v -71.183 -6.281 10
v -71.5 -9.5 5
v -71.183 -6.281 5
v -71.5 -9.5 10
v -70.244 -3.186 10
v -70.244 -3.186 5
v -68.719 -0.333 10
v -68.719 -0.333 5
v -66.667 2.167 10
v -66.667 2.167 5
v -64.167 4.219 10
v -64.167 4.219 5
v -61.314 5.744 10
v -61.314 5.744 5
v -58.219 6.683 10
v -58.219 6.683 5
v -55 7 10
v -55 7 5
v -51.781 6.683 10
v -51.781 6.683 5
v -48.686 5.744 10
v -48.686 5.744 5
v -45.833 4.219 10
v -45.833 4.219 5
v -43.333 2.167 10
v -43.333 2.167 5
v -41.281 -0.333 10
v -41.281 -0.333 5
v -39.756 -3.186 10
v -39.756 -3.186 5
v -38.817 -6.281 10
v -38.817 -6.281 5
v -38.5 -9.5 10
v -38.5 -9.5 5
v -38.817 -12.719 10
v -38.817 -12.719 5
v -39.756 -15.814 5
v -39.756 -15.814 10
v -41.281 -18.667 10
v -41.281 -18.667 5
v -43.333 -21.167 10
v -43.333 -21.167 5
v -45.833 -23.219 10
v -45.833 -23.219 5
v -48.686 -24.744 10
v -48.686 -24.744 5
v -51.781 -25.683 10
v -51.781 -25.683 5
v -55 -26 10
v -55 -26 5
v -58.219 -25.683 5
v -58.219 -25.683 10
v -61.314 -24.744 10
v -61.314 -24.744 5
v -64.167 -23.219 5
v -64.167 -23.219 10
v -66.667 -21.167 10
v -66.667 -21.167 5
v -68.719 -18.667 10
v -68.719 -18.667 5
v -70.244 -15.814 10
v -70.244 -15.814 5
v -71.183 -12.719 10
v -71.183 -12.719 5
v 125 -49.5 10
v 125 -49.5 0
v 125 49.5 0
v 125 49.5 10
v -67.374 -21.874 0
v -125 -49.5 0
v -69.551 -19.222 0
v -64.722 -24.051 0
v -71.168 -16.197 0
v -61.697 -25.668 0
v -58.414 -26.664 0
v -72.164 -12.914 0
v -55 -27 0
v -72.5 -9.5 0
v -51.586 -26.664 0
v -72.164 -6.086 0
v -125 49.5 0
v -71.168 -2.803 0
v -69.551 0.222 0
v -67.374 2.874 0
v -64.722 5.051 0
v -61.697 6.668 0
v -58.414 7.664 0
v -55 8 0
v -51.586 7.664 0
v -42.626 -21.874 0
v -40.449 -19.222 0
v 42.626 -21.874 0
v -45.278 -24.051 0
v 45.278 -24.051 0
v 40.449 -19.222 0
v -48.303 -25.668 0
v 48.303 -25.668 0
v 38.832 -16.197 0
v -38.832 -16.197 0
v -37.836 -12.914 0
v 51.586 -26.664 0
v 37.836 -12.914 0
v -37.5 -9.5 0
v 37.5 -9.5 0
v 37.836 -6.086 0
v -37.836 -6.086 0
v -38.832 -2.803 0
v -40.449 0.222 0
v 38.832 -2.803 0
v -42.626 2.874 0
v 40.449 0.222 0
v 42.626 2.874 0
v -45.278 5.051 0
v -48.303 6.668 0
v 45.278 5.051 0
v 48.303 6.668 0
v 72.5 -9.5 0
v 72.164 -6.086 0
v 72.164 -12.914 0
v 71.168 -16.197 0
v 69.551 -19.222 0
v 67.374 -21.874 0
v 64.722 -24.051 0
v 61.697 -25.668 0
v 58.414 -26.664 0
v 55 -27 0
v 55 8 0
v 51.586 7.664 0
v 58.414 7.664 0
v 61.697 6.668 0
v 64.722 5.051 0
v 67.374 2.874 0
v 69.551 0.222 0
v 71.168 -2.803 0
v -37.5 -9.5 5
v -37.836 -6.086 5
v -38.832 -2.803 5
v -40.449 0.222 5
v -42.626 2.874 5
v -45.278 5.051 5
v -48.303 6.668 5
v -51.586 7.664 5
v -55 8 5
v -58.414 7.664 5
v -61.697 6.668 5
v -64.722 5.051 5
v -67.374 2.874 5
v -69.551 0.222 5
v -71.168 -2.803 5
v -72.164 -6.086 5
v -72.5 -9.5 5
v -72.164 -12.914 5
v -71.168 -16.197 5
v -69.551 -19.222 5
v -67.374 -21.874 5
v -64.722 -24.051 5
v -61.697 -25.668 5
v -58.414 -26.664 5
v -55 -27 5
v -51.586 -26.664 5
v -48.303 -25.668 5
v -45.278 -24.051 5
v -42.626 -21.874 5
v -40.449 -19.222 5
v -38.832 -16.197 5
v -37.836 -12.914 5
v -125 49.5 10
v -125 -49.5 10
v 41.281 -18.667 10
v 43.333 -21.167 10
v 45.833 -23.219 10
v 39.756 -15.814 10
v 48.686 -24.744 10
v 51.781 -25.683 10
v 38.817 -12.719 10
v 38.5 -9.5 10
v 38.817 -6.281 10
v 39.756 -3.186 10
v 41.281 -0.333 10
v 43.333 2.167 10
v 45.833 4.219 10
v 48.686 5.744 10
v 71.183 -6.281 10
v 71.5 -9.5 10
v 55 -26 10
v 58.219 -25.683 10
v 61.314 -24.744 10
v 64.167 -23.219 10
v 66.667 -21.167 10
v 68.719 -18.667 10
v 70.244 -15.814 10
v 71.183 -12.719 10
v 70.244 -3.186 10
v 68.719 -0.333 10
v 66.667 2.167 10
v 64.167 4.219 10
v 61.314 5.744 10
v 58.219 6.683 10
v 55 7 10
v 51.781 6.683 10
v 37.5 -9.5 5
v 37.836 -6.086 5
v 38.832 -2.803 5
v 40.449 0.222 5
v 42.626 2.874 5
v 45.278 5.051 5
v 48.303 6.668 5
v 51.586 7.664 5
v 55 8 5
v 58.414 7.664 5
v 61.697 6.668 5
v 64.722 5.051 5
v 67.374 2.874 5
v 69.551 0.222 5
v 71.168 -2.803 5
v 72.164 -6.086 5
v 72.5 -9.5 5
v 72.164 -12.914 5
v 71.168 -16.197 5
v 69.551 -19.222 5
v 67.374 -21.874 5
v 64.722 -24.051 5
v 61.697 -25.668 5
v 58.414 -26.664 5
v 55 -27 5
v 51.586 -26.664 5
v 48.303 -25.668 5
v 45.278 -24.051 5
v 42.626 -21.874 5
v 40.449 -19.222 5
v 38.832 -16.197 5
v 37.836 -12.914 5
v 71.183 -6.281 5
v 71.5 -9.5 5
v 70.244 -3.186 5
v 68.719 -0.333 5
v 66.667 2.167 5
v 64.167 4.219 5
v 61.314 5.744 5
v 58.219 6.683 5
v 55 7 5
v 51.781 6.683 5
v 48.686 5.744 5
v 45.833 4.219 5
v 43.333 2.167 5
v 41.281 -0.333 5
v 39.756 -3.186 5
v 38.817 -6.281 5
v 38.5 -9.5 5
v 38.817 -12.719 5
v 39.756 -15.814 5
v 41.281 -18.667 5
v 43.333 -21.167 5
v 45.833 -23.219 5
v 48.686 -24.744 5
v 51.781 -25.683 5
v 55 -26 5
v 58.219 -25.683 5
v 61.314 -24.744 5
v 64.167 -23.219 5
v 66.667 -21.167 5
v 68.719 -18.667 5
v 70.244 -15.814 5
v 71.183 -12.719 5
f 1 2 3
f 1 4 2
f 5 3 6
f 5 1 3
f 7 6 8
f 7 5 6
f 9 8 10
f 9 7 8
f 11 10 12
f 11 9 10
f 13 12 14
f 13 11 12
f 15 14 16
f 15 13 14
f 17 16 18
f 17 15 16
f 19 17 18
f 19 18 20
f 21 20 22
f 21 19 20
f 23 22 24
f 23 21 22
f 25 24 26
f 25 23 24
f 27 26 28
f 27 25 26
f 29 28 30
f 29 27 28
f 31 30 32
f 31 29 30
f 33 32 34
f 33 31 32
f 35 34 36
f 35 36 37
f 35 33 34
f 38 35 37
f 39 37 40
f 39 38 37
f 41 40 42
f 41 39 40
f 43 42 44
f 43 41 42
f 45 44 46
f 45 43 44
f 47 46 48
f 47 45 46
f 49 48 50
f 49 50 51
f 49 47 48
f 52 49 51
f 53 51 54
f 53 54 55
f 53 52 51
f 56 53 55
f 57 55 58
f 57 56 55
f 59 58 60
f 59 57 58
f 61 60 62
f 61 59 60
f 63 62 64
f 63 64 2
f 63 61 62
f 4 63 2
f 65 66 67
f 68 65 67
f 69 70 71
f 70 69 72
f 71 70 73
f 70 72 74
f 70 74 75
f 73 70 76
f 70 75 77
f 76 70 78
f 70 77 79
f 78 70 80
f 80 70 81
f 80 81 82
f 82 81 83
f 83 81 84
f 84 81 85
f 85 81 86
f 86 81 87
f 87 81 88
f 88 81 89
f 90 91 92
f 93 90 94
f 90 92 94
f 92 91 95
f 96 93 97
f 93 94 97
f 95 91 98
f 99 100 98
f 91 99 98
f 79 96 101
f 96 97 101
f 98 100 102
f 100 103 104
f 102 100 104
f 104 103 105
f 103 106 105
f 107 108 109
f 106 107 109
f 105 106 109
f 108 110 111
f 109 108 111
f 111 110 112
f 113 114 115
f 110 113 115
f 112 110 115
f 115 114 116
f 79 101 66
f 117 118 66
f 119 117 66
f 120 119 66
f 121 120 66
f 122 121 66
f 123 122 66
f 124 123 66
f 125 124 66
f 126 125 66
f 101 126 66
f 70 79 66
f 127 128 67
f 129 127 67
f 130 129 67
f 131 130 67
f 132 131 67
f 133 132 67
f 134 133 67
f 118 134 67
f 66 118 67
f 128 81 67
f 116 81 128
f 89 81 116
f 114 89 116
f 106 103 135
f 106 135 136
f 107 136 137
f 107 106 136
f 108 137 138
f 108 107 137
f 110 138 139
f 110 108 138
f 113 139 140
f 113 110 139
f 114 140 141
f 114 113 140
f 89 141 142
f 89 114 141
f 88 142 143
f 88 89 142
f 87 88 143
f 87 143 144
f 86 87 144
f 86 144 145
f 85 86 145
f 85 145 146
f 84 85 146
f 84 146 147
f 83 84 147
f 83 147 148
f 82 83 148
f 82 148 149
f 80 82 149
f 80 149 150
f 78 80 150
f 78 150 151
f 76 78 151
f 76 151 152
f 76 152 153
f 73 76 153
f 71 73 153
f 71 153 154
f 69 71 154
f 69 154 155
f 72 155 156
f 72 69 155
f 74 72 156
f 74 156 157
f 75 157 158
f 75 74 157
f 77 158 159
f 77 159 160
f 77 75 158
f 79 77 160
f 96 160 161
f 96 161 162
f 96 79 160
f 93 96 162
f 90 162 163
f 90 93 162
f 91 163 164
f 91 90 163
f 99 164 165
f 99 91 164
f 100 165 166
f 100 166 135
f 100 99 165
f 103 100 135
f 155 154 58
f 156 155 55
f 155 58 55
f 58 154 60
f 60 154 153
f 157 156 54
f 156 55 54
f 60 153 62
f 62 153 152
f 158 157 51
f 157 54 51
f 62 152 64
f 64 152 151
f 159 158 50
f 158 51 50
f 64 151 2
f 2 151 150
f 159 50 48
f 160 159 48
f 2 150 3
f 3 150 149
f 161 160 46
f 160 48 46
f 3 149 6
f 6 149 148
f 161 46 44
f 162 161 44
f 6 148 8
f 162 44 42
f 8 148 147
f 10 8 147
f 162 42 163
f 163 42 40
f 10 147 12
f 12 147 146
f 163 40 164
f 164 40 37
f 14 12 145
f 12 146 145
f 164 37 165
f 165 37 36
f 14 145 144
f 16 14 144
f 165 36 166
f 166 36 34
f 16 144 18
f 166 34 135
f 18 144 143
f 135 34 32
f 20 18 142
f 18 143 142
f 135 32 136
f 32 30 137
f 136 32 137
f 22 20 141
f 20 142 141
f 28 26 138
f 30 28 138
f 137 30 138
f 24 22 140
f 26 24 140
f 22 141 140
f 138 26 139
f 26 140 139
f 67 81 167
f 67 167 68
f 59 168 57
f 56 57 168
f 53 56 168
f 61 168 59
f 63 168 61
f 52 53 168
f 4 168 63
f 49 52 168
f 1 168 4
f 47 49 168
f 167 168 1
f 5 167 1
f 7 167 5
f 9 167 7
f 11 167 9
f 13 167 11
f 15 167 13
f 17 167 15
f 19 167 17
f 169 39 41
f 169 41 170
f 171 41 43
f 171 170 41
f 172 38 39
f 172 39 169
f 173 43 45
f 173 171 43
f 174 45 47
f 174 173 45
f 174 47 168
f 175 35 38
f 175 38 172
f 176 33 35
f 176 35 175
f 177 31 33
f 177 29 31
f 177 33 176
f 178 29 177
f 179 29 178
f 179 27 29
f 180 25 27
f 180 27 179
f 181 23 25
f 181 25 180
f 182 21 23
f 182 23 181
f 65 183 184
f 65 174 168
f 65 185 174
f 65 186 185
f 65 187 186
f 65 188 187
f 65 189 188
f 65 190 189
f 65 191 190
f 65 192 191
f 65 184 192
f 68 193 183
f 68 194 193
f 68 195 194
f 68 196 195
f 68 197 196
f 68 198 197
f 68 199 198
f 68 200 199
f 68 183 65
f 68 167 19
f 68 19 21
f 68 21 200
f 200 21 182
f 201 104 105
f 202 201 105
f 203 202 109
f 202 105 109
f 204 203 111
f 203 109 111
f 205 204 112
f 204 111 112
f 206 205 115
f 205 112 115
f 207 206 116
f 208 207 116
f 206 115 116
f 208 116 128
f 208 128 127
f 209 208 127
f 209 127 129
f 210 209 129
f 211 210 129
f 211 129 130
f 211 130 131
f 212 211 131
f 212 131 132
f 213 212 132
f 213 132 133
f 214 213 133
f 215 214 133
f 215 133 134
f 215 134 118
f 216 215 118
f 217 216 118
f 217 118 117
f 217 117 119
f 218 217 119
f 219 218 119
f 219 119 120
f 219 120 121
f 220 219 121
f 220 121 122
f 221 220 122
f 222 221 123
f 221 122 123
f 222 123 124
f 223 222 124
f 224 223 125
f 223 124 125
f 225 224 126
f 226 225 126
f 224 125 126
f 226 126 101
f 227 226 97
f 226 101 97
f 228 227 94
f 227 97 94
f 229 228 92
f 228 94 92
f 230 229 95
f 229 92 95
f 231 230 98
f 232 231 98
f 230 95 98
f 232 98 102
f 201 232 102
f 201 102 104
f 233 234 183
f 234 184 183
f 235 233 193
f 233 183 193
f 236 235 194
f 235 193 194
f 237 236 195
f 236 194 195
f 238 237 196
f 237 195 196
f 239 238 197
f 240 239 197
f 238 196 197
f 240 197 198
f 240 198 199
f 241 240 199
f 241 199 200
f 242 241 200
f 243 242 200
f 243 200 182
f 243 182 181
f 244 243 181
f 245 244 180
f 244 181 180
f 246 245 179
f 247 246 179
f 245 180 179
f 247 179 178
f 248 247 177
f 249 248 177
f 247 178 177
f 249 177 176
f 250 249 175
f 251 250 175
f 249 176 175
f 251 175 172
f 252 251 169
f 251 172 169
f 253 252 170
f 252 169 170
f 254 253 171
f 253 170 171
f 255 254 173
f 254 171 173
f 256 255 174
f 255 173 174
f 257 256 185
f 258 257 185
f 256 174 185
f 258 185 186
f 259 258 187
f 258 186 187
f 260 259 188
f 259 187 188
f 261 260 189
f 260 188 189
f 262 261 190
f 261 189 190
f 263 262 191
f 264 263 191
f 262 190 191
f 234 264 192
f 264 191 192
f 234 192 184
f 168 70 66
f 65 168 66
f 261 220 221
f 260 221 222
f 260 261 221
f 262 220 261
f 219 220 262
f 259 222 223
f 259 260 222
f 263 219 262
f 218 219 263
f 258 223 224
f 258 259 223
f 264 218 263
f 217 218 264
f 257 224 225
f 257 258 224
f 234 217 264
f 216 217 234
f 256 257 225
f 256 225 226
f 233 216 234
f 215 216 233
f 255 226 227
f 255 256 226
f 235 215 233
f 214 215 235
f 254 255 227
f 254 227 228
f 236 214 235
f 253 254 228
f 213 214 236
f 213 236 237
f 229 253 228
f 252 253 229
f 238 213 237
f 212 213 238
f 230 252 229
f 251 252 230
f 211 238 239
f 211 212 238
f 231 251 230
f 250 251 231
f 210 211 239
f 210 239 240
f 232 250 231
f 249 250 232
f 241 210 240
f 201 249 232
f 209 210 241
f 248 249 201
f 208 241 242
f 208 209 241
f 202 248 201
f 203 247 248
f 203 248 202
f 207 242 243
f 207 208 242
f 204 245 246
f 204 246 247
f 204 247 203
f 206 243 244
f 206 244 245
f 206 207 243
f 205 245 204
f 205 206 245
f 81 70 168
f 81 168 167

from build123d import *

# Parameters (mm, degrees)
SKETCH1_W                               = 250
SKETCH1_H                               = 99
BOSS_EXTRUDE1_DEPTH                     = 10
CBORE_FOR_M5_HEX_HEAD_BOLT1_D           = 33
CBORE_FOR_M5_HEX_HEAD_BOLT1_CBORE_D     = 35
CBORE_FOR_M5_HEX_HEAD_BOLT1_CBORE_DEPTH = 5


with BuildPart() as part:
    # Sketch1 → Boss-Extrude1 (new body)
    with BuildSketch(Plane.XY):
        Rectangle(SKETCH1_W, SKETCH1_H)
    extrude(amount=BOSS_EXTRUDE1_DEPTH)

    # CBORE for M5 Hex Head Bolt1 (through all)
    with Locations(Plane(origin=(0, 0, 0), x_dir=(-1, 0, 0), z_dir=(0, 0, -1))):
        with Locations((-55, -9.5)):
            cbore_for_m5_hex_head_bolt1 = CounterBoreHole(CBORE_FOR_M5_HEX_HEAD_BOLT1_D / 2, CBORE_FOR_M5_HEX_HEAD_BOLT1_CBORE_D / 2, CBORE_FOR_M5_HEX_HEAD_BOLT1_CBORE_DEPTH)

    # Mirror1: CBORE for M5 Hex Head Bolt1 across plane
    add(cbore_for_m5_hex_head_bolt1.mirror(Plane(origin=(0, 0, 0), x_dir=(0, 0, 1), z_dir=(1, 0, 0))), mode=Mode.SUBTRACT)


solid = part.part
